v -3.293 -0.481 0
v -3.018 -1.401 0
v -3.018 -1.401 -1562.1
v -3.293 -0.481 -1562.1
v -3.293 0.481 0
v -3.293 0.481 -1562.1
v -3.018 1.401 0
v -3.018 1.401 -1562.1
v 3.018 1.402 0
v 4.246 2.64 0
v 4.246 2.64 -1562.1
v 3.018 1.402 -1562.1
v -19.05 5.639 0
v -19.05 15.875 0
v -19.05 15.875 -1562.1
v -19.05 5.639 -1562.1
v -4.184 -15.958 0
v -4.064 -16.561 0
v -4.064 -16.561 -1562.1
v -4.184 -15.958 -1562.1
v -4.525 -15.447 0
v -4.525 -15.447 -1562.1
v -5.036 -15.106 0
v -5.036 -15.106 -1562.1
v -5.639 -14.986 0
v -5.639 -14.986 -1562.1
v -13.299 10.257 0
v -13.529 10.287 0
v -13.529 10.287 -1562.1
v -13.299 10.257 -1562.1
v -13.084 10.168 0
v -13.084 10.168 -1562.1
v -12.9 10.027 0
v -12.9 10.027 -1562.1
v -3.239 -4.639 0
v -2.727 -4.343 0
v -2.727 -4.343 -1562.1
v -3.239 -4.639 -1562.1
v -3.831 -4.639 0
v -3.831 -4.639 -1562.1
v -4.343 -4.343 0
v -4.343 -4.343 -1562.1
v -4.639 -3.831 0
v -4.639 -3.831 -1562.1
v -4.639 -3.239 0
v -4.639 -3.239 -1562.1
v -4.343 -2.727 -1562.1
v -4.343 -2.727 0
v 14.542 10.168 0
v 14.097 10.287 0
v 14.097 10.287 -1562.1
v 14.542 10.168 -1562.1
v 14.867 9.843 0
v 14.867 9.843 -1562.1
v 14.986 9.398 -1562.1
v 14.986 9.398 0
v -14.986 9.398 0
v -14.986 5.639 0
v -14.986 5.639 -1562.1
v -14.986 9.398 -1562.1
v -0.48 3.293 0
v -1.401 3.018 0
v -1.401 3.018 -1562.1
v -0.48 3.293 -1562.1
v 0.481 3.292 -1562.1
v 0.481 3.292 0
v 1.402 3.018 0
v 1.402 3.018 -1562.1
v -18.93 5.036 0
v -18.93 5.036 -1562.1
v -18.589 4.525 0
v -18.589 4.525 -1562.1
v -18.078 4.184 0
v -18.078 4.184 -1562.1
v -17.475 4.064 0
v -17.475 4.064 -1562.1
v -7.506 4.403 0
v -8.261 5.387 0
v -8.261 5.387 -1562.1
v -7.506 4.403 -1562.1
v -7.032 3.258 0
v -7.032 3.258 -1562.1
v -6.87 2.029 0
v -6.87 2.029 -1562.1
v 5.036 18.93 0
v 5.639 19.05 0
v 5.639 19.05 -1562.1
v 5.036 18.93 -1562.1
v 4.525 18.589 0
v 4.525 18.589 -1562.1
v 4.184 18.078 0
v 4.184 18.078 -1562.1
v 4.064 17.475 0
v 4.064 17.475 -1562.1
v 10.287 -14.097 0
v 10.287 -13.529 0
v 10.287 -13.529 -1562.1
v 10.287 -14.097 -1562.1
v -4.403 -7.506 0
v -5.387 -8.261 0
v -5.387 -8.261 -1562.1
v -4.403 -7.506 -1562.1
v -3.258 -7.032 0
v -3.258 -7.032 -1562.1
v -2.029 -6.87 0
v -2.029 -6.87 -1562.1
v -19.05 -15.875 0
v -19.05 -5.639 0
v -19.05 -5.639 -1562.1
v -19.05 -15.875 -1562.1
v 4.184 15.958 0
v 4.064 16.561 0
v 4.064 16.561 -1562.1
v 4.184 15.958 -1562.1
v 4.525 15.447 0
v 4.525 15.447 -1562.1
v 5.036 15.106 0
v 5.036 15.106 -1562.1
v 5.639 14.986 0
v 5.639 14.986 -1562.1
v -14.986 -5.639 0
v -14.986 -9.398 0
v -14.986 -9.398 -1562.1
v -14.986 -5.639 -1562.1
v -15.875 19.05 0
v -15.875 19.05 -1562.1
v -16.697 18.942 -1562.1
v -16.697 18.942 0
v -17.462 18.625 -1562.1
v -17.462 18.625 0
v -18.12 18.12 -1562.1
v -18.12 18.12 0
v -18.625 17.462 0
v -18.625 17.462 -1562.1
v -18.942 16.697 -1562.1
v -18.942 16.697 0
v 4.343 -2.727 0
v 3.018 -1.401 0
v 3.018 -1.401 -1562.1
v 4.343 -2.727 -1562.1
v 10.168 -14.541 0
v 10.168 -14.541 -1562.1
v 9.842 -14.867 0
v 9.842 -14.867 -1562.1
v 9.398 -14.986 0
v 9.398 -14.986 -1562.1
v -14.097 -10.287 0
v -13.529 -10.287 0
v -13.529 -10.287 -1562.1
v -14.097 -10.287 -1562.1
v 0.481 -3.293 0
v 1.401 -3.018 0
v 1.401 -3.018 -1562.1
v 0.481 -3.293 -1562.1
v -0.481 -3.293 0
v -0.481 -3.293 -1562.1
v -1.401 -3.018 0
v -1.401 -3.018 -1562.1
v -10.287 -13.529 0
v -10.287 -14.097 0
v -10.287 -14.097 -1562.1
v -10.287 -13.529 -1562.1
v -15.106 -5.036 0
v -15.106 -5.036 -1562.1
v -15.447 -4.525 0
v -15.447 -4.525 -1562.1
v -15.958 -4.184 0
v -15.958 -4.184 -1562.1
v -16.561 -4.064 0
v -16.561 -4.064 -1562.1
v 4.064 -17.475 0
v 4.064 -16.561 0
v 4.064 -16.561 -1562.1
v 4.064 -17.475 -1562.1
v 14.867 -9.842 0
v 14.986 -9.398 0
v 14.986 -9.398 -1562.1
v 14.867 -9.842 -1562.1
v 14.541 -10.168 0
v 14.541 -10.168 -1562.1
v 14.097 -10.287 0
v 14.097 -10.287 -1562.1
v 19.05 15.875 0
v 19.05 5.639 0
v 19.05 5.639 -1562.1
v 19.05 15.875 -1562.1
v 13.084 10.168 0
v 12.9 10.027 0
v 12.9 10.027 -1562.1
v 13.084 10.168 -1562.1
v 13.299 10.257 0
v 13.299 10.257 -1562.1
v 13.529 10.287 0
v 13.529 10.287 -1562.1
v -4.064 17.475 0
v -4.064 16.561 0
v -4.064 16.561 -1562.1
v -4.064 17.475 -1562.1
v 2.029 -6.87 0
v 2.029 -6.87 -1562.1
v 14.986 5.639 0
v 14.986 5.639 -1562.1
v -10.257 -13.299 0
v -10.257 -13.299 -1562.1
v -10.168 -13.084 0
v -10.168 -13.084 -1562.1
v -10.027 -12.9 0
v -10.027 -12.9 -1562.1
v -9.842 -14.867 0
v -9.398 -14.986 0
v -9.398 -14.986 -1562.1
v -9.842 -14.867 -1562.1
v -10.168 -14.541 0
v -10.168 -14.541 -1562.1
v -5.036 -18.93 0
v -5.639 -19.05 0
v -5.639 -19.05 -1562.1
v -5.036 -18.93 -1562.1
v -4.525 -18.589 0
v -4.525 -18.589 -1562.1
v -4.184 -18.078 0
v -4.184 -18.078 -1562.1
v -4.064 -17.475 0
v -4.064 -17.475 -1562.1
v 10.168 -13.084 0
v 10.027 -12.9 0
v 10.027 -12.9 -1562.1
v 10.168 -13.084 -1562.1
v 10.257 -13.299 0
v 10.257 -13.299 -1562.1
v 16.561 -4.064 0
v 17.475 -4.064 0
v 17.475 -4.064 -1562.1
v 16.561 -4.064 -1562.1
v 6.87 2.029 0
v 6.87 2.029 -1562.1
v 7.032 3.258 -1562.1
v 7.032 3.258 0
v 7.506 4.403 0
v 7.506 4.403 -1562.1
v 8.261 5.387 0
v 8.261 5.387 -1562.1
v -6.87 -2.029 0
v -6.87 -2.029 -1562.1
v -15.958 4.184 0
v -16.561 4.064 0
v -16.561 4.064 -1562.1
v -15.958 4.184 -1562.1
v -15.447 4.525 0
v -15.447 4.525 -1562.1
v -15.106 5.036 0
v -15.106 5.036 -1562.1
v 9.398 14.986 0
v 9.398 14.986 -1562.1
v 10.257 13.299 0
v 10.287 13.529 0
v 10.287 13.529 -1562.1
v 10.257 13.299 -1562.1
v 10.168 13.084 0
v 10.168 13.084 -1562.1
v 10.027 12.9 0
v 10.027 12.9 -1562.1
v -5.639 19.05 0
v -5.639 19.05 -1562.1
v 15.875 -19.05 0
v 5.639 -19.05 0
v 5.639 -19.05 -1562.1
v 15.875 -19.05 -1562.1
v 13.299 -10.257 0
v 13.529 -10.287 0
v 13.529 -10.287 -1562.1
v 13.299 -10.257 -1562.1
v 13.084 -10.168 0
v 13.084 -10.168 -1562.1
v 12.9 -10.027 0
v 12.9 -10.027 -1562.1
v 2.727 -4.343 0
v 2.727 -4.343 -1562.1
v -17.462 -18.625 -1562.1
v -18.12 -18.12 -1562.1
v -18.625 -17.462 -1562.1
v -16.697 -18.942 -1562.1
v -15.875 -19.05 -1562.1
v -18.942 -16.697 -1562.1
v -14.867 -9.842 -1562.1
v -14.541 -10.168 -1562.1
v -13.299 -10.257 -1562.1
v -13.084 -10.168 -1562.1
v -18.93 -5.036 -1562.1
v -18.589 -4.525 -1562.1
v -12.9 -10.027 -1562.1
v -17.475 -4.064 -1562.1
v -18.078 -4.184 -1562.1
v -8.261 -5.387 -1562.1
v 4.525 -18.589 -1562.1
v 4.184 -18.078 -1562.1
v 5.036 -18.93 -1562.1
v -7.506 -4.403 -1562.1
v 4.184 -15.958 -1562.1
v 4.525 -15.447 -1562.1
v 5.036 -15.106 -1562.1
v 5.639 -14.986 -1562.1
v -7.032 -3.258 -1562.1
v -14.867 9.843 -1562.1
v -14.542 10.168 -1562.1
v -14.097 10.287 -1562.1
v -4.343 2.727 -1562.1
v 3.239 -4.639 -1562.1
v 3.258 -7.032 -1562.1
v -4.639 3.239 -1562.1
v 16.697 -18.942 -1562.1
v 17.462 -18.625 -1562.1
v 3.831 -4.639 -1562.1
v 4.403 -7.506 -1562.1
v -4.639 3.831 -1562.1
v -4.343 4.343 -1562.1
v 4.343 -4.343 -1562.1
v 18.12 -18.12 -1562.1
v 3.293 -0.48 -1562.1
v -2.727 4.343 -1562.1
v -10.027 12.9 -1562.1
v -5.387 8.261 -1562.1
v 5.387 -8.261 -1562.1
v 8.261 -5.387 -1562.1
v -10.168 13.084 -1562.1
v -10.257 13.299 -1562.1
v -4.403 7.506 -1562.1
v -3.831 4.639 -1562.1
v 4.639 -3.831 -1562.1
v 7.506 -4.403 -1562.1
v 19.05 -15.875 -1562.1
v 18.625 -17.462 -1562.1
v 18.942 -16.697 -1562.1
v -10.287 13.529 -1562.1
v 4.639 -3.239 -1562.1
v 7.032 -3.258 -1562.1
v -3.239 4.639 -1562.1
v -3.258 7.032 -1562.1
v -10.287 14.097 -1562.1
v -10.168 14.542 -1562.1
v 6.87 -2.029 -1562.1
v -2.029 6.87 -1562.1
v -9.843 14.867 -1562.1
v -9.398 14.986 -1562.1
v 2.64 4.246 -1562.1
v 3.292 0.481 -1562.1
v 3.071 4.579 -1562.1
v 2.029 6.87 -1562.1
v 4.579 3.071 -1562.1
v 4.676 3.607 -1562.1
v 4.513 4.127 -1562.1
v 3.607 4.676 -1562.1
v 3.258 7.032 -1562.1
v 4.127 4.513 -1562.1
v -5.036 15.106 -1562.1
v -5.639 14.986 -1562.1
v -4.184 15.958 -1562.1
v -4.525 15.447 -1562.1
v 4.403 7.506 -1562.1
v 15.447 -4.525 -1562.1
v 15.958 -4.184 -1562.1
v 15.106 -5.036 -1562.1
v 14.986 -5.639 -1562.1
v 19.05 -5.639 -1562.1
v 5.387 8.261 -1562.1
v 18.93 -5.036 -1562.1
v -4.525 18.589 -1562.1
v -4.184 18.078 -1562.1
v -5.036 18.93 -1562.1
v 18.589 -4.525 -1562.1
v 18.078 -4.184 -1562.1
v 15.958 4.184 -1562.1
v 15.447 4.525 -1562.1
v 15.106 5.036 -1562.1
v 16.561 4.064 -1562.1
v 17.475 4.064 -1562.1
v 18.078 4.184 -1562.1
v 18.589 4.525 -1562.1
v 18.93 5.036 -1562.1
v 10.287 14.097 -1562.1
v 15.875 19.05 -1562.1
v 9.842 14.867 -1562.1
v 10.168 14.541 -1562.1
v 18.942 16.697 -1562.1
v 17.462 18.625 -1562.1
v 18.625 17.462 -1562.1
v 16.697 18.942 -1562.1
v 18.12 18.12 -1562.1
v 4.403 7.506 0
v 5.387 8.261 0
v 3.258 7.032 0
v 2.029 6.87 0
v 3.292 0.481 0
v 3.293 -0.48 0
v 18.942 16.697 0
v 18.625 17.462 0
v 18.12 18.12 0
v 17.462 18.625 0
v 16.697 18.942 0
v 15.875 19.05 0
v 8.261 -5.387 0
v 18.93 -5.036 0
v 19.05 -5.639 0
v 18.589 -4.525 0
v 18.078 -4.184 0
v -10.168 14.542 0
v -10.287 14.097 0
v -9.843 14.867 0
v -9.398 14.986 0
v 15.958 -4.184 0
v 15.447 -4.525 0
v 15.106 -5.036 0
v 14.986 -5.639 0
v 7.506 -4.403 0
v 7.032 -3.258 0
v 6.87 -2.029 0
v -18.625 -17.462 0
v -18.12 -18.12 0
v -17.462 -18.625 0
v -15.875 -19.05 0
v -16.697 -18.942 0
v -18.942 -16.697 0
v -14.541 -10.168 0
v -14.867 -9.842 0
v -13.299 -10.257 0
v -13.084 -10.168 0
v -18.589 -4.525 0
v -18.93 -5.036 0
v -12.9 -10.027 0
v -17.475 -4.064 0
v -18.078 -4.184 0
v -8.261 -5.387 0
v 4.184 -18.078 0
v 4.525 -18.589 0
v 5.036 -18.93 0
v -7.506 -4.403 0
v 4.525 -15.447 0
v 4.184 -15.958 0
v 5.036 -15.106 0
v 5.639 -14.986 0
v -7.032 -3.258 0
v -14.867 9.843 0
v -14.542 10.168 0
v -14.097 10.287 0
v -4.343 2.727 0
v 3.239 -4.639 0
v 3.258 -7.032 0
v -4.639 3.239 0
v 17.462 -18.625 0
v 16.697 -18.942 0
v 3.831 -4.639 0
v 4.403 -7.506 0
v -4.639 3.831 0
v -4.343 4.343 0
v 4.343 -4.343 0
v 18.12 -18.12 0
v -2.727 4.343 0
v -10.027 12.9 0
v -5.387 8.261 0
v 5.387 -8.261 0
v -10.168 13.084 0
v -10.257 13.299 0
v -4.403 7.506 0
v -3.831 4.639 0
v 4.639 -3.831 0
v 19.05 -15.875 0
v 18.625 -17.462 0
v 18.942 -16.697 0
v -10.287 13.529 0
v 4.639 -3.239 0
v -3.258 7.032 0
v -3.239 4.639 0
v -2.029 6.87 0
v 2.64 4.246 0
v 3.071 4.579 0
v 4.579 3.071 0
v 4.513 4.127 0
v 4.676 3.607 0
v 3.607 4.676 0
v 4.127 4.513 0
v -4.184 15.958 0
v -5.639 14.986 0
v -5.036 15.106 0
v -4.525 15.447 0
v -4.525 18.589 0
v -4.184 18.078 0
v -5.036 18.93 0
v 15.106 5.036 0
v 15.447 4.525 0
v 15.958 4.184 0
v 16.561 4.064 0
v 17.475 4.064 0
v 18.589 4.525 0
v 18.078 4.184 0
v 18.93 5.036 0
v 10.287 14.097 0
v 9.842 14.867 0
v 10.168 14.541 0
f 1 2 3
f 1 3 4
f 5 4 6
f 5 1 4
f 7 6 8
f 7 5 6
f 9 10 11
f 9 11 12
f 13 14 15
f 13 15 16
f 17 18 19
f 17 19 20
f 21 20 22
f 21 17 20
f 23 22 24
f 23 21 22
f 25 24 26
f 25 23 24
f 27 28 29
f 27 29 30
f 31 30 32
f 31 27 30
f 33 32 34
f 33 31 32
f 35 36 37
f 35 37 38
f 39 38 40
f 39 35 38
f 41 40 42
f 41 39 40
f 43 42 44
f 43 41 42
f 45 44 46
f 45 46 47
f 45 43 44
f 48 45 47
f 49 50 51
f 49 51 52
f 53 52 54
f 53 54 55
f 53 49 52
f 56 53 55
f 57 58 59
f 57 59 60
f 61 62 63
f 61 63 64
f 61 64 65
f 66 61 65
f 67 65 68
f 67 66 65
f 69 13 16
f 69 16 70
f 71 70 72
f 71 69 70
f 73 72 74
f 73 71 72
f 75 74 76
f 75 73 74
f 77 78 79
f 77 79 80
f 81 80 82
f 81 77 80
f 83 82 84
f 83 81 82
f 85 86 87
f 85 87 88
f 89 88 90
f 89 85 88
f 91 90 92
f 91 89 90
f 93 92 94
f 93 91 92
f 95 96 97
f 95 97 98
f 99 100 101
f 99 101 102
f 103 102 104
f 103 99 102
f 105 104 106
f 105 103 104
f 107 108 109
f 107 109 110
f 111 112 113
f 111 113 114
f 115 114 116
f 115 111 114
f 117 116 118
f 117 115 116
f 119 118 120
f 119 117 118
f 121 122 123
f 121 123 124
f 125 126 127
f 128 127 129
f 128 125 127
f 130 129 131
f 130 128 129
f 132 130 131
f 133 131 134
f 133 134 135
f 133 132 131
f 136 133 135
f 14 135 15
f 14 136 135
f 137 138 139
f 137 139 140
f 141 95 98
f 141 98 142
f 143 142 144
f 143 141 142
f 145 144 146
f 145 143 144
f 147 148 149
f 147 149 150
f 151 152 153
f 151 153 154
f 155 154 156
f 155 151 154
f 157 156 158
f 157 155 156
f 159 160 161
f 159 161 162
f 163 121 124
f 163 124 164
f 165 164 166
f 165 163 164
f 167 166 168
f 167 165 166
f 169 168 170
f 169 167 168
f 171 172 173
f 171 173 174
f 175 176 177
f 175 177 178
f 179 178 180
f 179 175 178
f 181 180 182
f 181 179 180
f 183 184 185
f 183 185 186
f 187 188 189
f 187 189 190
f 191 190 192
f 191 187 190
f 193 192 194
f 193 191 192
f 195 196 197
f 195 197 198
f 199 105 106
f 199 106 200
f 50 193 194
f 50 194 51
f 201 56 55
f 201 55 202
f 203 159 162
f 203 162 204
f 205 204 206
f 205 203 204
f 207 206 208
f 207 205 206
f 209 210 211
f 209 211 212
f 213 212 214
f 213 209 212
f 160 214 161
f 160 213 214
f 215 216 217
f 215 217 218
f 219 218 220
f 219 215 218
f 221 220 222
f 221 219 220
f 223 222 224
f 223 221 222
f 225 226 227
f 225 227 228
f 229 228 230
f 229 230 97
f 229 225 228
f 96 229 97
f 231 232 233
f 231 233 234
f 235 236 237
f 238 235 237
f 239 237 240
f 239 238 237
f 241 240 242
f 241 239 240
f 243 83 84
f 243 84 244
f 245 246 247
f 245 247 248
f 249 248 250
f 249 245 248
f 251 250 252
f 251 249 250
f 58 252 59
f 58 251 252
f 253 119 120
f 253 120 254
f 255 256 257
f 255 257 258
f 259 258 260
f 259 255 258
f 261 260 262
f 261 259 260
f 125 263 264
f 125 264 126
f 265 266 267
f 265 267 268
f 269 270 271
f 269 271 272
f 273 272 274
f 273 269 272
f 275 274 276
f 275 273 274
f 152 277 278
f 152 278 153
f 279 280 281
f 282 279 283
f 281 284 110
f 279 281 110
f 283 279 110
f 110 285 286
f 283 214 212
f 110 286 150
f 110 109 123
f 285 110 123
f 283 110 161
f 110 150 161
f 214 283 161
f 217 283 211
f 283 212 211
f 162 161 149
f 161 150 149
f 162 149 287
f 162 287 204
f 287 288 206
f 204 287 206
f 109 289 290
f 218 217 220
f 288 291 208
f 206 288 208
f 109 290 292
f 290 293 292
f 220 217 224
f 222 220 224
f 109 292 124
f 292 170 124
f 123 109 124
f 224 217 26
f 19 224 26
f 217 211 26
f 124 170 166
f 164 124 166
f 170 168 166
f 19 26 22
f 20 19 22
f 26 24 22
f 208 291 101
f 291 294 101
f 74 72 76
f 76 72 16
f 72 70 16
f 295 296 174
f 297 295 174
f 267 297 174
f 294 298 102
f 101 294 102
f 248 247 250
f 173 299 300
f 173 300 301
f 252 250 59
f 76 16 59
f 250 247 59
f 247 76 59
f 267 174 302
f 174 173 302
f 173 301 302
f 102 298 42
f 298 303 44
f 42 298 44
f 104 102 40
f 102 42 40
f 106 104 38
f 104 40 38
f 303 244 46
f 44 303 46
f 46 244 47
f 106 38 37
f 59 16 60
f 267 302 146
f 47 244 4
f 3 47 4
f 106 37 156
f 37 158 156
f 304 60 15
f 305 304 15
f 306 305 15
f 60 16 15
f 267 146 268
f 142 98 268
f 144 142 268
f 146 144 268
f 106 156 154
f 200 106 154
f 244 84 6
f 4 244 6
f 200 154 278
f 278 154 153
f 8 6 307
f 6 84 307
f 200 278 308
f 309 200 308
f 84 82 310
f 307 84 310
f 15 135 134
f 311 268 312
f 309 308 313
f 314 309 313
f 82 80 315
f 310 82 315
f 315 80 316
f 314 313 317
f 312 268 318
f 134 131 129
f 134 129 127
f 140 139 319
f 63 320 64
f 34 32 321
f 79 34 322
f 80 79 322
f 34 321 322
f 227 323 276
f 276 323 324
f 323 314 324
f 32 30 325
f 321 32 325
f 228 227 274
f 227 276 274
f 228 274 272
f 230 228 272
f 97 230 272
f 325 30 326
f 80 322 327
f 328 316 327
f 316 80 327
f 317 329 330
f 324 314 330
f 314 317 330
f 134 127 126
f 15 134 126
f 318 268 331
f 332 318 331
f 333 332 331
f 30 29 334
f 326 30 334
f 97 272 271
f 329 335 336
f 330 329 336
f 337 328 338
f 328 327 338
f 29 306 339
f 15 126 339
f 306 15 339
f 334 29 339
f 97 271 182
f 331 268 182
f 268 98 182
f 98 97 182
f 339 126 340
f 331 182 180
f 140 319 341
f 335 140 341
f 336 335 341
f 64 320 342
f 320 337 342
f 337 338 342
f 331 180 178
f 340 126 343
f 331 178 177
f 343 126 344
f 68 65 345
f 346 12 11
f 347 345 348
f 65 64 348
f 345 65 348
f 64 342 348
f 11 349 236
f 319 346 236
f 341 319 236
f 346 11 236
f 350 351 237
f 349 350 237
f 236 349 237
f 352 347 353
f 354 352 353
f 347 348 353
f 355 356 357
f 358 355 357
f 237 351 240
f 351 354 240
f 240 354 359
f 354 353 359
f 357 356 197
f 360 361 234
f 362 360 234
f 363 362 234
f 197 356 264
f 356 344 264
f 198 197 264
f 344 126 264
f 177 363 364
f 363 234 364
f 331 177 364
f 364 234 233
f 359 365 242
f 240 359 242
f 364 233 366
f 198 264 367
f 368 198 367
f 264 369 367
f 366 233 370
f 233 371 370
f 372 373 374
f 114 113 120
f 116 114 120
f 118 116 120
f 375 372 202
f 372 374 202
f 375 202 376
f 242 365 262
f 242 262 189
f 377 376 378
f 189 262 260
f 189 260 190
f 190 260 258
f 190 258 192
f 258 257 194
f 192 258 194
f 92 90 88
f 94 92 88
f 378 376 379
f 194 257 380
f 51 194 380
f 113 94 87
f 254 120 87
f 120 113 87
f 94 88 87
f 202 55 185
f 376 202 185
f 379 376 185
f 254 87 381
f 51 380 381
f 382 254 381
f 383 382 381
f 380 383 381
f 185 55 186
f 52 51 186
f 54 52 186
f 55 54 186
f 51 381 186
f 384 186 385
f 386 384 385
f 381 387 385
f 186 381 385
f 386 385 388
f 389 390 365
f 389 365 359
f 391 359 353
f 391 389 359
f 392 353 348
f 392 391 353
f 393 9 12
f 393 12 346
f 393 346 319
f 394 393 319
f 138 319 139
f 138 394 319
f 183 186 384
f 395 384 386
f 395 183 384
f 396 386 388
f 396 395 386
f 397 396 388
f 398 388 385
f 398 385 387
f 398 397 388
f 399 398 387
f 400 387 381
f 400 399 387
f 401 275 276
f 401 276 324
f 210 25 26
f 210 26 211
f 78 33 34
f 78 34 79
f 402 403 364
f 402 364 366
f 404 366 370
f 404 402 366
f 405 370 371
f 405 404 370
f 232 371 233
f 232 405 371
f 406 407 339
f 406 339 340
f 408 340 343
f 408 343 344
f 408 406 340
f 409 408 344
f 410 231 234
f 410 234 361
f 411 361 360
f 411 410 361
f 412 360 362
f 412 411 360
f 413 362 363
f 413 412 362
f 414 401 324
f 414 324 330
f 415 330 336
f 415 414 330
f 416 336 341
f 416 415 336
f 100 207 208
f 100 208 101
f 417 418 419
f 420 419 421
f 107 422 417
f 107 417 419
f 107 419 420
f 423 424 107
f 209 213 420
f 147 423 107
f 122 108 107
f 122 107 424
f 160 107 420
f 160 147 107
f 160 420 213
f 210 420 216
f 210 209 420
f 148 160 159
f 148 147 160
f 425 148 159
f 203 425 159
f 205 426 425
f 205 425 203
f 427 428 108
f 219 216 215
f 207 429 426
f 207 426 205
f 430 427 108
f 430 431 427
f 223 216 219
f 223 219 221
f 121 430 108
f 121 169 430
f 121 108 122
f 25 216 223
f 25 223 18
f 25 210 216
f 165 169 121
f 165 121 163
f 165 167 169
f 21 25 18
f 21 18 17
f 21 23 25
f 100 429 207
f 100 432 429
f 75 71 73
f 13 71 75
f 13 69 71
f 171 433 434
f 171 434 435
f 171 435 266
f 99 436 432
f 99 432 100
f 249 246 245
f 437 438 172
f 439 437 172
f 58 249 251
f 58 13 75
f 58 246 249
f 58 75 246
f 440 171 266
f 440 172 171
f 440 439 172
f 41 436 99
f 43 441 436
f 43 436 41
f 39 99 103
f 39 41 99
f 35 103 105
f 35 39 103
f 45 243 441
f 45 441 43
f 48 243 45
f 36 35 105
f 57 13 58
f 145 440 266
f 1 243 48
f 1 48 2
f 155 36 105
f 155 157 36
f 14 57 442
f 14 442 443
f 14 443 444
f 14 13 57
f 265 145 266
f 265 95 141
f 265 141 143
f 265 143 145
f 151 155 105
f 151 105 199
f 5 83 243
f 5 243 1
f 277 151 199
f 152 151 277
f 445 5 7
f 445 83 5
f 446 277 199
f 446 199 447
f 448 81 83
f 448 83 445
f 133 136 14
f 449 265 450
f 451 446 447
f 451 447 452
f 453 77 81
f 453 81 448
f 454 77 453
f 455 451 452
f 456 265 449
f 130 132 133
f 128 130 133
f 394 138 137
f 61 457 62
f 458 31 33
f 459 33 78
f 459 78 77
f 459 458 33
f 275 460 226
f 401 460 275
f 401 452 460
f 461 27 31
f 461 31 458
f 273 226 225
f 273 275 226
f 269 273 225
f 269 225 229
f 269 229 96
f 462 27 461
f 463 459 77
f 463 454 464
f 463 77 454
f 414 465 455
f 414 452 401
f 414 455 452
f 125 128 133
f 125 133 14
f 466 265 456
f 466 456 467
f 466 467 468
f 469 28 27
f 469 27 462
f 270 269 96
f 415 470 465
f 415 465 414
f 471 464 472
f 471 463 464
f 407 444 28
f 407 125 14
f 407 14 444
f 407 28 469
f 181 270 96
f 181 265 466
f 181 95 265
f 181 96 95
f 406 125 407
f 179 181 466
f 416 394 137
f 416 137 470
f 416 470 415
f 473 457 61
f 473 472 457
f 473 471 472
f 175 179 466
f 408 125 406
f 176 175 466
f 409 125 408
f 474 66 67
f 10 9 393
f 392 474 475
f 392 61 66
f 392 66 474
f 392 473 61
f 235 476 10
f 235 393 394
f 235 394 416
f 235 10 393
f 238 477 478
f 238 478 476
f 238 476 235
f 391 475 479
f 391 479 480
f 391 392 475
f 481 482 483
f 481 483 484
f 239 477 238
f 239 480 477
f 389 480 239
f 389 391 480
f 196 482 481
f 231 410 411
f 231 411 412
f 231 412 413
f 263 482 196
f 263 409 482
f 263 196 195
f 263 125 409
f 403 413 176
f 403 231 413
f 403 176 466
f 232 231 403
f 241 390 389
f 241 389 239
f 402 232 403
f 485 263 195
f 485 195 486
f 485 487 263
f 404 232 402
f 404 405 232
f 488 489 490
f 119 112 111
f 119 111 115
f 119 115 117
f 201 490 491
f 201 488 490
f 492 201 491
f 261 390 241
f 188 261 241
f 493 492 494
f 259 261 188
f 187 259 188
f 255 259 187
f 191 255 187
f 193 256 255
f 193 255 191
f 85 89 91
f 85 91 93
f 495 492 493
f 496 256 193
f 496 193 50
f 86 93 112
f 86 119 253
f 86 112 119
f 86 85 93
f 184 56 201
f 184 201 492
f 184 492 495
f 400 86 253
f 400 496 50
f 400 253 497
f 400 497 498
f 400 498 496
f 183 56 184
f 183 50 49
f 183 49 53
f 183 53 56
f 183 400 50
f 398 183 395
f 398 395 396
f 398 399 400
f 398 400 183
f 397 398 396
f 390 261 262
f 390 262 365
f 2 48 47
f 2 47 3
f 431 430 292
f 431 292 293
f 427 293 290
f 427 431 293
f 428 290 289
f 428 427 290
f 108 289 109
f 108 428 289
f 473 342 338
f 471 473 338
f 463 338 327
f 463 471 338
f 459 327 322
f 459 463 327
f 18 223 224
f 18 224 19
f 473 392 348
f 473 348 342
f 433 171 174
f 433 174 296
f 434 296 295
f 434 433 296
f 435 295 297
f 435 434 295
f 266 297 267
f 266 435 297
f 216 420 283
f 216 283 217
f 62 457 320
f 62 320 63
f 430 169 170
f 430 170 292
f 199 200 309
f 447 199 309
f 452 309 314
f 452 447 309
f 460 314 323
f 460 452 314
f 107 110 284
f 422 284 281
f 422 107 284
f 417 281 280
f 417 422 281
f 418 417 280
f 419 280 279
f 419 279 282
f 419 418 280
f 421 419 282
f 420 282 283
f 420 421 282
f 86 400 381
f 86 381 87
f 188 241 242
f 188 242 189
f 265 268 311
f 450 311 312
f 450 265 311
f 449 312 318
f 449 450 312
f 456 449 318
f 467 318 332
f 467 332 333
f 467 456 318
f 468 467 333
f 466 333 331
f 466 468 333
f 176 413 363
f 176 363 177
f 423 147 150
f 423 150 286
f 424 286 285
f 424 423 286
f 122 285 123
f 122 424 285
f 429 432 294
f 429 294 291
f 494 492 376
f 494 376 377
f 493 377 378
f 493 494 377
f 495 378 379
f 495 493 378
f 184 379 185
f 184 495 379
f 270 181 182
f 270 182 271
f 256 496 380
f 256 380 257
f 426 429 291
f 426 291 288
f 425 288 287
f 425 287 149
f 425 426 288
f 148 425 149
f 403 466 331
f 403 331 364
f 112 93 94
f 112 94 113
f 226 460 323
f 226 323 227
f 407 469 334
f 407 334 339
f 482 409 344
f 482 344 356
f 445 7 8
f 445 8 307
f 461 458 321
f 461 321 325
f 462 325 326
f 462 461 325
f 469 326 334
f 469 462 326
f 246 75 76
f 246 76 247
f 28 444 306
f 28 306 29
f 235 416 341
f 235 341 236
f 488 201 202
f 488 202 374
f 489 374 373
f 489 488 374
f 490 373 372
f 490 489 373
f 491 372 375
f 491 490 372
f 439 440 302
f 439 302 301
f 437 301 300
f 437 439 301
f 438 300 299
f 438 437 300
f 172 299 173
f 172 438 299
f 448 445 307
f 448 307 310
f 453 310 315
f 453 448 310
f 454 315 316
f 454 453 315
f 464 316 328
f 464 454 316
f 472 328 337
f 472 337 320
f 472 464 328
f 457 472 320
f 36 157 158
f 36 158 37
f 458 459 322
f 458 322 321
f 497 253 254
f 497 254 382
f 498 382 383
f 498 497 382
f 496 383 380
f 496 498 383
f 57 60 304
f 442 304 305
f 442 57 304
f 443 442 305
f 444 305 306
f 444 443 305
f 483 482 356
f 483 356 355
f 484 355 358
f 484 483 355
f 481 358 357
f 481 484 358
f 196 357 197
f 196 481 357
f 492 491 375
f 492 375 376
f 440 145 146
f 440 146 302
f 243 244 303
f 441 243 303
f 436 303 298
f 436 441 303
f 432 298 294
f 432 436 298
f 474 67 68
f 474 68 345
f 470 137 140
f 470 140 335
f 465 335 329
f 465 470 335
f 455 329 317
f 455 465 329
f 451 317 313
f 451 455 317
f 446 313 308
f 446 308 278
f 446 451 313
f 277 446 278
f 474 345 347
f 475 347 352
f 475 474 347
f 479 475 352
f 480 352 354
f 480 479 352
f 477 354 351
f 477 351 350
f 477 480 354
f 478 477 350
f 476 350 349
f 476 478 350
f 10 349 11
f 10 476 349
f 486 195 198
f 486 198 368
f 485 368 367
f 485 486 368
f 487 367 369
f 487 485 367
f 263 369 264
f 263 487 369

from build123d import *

# Parameters (mm, degrees)
EXTRUDE1_DEPTH = 1562.1


with BuildPart() as part:
    # Sketch1 → Extrude1 (new body)
    with BuildSketch(Plane.XY):
        with BuildLine():
            Line((14.986, -5.6388), (14.986, -9.398))
            ThreePointArc((14.986, -9.398), (14.725617928, -10.026617928), (14.097, -10.287))
            Line((14.097, -10.287), (13.528917816, -10.287))
            ThreePointArc((13.528917816, -10.287), (13.188712244, -10.219328904), (12.900299887, -10.026617928))
            Line((12.900299887, -10.026617928), (8.260840349, -5.38715839))
            ThreePointArc((8.260840349, -5.38715839), (7.231213135, -3.846212368), (6.869656138, -2.028542601))
            Line((6.869656138, -2.028542601), (6.869656138, 2.028542601))
            ThreePointArc((6.869656138, 2.028542601), (7.231213135, 3.846212368), (8.260840349, 5.38715839))
            Line((8.260840349, 5.38715839), (12.900299887, 10.026617929))
            ThreePointArc((12.900299887, 10.026617929), (13.188712244, 10.219328904), (13.528917816, 10.287))
            Line((13.528917816, 10.287), (14.097, 10.287))
            ThreePointArc((14.097, 10.287), (14.725617928, 10.026617929), (14.986, 9.398))
            Line((14.986, 9.398), (14.986, 5.6388))
            ThreePointArc((14.986, 5.6388), (15.447248241, 4.525248241), (16.5608, 4.064))
            Line((16.5608, 4.064), (17.4752, 4.064))
            ThreePointArc((17.4752, 4.064), (18.588751759, 4.525248241), (19.05, 5.6388))
            Line((19.05, 5.6388), (19.05, 15.875))
            ThreePointArc((19.05, 15.875), (18.12006403, 18.12006403), (15.875, 19.05))
            Line((15.875, 19.05), (5.6388, 19.05))
            ThreePointArc((5.6388, 19.05), (4.525248241, 18.588751759), (4.064, 17.4752))
            Line((4.064, 17.4752), (4.064, 16.5608))
            ThreePointArc((4.064, 16.5608), (4.525248241, 15.447248241), (5.6388, 14.986))
            Line((5.6388, 14.986), (9.398, 14.986))
            ThreePointArc((9.398, 14.986), (10.026617928, 14.725617928), (10.287, 14.097))
            Line((10.287, 14.097), (10.287, 13.528917816))
            ThreePointArc((10.287, 13.528917816), (10.219328904, 13.188712244), (10.026617928, 12.900299887))
            Line((10.026617928, 12.900299887), (5.38715839, 8.260840349))
            ThreePointArc((5.38715839, 8.260840349), (3.846212368, 7.231213135), (2.028542601, 6.869656138))
            Line((2.028542601, 6.869656138), (-2.028542601, 6.869656138))
            ThreePointArc((-2.028542601, 6.869656138), (-3.846212368, 7.231213135), (-5.38715839, 8.260840349))
            Line((-5.38715839, 8.260840349), (-10.026617929, 12.900299887))
            ThreePointArc((-10.026617929, 12.900299887), (-10.219328904, 13.188712244), (-10.287, 13.528917816))
            Line((-10.287, 13.528917816), (-10.287, 14.097))
            ThreePointArc((-10.287, 14.097), (-10.026617929, 14.725617928), (-9.398, 14.986))
            Line((-9.398, 14.986), (-5.6388, 14.986))
            ThreePointArc((-5.6388, 14.986), (-4.525248241, 15.447248241), (-4.064, 16.5608))
            Line((-4.064, 16.5608), (-4.064, 17.4752))
            ThreePointArc((-4.064, 17.4752), (-4.525248241, 18.588751759), (-5.6388, 19.05))
            Line((-5.6388, 19.05), (-15.875, 19.05))
            ThreePointArc((-15.875, 19.05), (-18.12006403, 18.12006403), (-19.05, 15.875))
            Line((-19.05, 15.875), (-19.05, 5.6388))
            ThreePointArc((-19.05, 5.6388), (-18.588751759, 4.525248241), (-17.4752, 4.064))
            Line((-17.4752, 4.064), (-16.5608, 4.064))
            ThreePointArc((-16.5608, 4.064), (-15.447248241, 4.525248241), (-14.986, 5.6388))
            Line((-14.986, 5.6388), (-14.986, 9.398))
            ThreePointArc((-14.986, 9.398), (-14.725617929, 10.026617928), (-14.097, 10.287))
            Line((-14.097, 10.287), (-13.528917816, 10.287))
            ThreePointArc((-13.528917816, 10.287), (-13.188712244, 10.219328904), (-12.900299887, 10.026617928))
            Line((-12.900299887, 10.026617928), (-8.260840349, 5.38715839))
            ThreePointArc((-8.260840349, 5.38715839), (-7.231213135, 3.846212368), (-6.869656138, 2.028542601))
            Line((-6.869656138, 2.028542601), (-6.869656138, -2.028542601))
            ThreePointArc((-6.869656138, -2.028542601), (-7.231213135, -3.846212368), (-8.260840349, -5.38715839))
            Line((-8.260840349, -5.38715839), (-12.900299887, -10.026617928))
            ThreePointArc((-12.900299887, -10.026617928), (-13.188712244, -10.219328904), (-13.528917816, -10.287))
            Line((-13.528917816, -10.287), (-14.097, -10.287))
            ThreePointArc((-14.097, -10.287), (-14.725617928, -10.026617928), (-14.986, -9.398))
            Line((-14.986, -9.398), (-14.986, -5.6388))
            ThreePointArc((-14.986, -5.6388), (-15.447248241, -4.525248241), (-16.5608, -4.064))
            Line((-16.5608, -4.064), (-17.4752, -4.064))
            ThreePointArc((-17.4752, -4.064), (-18.588751759, -4.525248241), (-19.05, -5.6388))
            Line((-19.05, -5.6388), (-19.05, -15.875))
            ThreePointArc((-19.05, -15.875), (-18.12006403, -18.12006403), (-15.875, -19.05))
            Line((-15.875, -19.05), (-5.6388, -19.05))
            ThreePointArc((-5.6388, -19.05), (-4.525248241, -18.588751759), (-4.064, -17.4752))
            Line((-4.064, -17.4752), (-4.064, -16.5608))
            ThreePointArc((-4.064, -16.5608), (-4.525248241, -15.447248241), (-5.6388, -14.986))
            Line((-5.6388, -14.986), (-9.398, -14.986))
            ThreePointArc((-9.398, -14.986), (-10.026617928, -14.725617928), (-10.287, -14.097))
            Line((-10.287, -14.097), (-10.287, -13.528917816))
            ThreePointArc((-10.287, -13.528917816), (-10.219328904, -13.188712244), (-10.026617928, -12.900299887))
            Line((-10.026617928, -12.900299887), (-5.38715839, -8.260840349))
            ThreePointArc((-5.38715839, -8.260840349), (-3.846212368, -7.231213135), (-2.028542601, -6.869656138))
            Line((-2.028542601, -6.869656138), (2.028542601, -6.869656138))
            ThreePointArc((2.028542601, -6.869656138), (3.846212368, -7.231213135), (5.38715839, -8.260840349))
            Line((5.38715839, -8.260840349), (10.026617928, -12.900299887))
            ThreePointArc((10.026617928, -12.900299887), (10.219328904, -13.188712244), (10.287, -13.528917816))
            Line((10.287, -13.528917816), (10.287, -14.097))
            ThreePointArc((10.287, -14.097), (10.026617928, -14.725617928), (9.398, -14.986))
            Line((9.398, -14.986), (5.6388, -14.986))
            ThreePointArc((5.6388, -14.986), (4.525248241, -15.447248241), (4.064, -16.5608))
            Line((4.064, -16.5608), (4.064, -17.4752))
            ThreePointArc((4.064, -17.4752), (4.525248241, -18.588751759), (5.6388, -19.05))
            Line((5.6388, -19.05), (15.875, -19.05))
            ThreePointArc((15.875, -19.05), (18.12006403, -18.12006403), (19.05, -15.875))
            Line((19.05, -15.875), (19.05, -5.6388))
            ThreePointArc((19.05, -5.6388), (18.588751759, -4.525248241), (17.4752, -4.064))
            Line((17.4752, -4.064), (16.5608, -4.064))
            ThreePointArc((16.5608, -4.064), (15.447248241, -4.525248241), (14.986, -5.6388))
        make_face()
        with BuildLine():
            Line((4.24561082, 2.639761197), (3.01775857, 1.401686117))
            ThreePointArc((3.01775857, 1.401686117), (3.327399997, 0.000140662), (3.017877069, -1.401430967))
            Line((3.017877069, -1.401430967), (4.343300873, -2.726854771))
            ThreePointArc((4.343300873, -2.726854771), (4.343300873, -4.343300873), (2.726854771, -4.343300873))
            Line((2.726854771, -4.343300873), (1.401430967, -3.017877069))
            ThreePointArc((1.401430967, -3.017877069), (0, -3.3274), (-1.401430967, -3.017877069))
            Line((-1.401430967, -3.017877069), (-2.726854771, -4.343300873))
            ThreePointArc((-2.726854771, -4.343300873), (-4.343300873, -4.343300873), (-4.343300873, -2.726854771))
            Line((-4.343300873, -2.726854771), (-3.017877069, -1.401430967))
            ThreePointArc((-3.017877069, -1.401430967), (-3.3274, 0), (-3.017877069, 1.401430967))
            Line((-3.017877069, 1.401430967), (-4.343300873, 2.726854771))
            ThreePointArc((-4.343300873, 2.726854771), (-4.343300873, 4.343300873), (-2.726854771, 4.343300873))
            Line((-2.726854771, 4.343300873), (-1.401430967, 3.017877069))
            ThreePointArc((-1.401430967, 3.017877069), (0.000140662, 3.327399997), (1.401686117, 3.01775857))
            Line((1.401686117, 3.01775857), (2.639761197, 4.24561082))
            ThreePointArc((2.639761197, 4.24561082), (4.343300873, 4.343300873), (4.24561082, 2.639761197))
        make_face(mode=Mode.SUBTRACT)
    extrude(amount=-EXTRUDE1_DEPTH)


solid = part.part
